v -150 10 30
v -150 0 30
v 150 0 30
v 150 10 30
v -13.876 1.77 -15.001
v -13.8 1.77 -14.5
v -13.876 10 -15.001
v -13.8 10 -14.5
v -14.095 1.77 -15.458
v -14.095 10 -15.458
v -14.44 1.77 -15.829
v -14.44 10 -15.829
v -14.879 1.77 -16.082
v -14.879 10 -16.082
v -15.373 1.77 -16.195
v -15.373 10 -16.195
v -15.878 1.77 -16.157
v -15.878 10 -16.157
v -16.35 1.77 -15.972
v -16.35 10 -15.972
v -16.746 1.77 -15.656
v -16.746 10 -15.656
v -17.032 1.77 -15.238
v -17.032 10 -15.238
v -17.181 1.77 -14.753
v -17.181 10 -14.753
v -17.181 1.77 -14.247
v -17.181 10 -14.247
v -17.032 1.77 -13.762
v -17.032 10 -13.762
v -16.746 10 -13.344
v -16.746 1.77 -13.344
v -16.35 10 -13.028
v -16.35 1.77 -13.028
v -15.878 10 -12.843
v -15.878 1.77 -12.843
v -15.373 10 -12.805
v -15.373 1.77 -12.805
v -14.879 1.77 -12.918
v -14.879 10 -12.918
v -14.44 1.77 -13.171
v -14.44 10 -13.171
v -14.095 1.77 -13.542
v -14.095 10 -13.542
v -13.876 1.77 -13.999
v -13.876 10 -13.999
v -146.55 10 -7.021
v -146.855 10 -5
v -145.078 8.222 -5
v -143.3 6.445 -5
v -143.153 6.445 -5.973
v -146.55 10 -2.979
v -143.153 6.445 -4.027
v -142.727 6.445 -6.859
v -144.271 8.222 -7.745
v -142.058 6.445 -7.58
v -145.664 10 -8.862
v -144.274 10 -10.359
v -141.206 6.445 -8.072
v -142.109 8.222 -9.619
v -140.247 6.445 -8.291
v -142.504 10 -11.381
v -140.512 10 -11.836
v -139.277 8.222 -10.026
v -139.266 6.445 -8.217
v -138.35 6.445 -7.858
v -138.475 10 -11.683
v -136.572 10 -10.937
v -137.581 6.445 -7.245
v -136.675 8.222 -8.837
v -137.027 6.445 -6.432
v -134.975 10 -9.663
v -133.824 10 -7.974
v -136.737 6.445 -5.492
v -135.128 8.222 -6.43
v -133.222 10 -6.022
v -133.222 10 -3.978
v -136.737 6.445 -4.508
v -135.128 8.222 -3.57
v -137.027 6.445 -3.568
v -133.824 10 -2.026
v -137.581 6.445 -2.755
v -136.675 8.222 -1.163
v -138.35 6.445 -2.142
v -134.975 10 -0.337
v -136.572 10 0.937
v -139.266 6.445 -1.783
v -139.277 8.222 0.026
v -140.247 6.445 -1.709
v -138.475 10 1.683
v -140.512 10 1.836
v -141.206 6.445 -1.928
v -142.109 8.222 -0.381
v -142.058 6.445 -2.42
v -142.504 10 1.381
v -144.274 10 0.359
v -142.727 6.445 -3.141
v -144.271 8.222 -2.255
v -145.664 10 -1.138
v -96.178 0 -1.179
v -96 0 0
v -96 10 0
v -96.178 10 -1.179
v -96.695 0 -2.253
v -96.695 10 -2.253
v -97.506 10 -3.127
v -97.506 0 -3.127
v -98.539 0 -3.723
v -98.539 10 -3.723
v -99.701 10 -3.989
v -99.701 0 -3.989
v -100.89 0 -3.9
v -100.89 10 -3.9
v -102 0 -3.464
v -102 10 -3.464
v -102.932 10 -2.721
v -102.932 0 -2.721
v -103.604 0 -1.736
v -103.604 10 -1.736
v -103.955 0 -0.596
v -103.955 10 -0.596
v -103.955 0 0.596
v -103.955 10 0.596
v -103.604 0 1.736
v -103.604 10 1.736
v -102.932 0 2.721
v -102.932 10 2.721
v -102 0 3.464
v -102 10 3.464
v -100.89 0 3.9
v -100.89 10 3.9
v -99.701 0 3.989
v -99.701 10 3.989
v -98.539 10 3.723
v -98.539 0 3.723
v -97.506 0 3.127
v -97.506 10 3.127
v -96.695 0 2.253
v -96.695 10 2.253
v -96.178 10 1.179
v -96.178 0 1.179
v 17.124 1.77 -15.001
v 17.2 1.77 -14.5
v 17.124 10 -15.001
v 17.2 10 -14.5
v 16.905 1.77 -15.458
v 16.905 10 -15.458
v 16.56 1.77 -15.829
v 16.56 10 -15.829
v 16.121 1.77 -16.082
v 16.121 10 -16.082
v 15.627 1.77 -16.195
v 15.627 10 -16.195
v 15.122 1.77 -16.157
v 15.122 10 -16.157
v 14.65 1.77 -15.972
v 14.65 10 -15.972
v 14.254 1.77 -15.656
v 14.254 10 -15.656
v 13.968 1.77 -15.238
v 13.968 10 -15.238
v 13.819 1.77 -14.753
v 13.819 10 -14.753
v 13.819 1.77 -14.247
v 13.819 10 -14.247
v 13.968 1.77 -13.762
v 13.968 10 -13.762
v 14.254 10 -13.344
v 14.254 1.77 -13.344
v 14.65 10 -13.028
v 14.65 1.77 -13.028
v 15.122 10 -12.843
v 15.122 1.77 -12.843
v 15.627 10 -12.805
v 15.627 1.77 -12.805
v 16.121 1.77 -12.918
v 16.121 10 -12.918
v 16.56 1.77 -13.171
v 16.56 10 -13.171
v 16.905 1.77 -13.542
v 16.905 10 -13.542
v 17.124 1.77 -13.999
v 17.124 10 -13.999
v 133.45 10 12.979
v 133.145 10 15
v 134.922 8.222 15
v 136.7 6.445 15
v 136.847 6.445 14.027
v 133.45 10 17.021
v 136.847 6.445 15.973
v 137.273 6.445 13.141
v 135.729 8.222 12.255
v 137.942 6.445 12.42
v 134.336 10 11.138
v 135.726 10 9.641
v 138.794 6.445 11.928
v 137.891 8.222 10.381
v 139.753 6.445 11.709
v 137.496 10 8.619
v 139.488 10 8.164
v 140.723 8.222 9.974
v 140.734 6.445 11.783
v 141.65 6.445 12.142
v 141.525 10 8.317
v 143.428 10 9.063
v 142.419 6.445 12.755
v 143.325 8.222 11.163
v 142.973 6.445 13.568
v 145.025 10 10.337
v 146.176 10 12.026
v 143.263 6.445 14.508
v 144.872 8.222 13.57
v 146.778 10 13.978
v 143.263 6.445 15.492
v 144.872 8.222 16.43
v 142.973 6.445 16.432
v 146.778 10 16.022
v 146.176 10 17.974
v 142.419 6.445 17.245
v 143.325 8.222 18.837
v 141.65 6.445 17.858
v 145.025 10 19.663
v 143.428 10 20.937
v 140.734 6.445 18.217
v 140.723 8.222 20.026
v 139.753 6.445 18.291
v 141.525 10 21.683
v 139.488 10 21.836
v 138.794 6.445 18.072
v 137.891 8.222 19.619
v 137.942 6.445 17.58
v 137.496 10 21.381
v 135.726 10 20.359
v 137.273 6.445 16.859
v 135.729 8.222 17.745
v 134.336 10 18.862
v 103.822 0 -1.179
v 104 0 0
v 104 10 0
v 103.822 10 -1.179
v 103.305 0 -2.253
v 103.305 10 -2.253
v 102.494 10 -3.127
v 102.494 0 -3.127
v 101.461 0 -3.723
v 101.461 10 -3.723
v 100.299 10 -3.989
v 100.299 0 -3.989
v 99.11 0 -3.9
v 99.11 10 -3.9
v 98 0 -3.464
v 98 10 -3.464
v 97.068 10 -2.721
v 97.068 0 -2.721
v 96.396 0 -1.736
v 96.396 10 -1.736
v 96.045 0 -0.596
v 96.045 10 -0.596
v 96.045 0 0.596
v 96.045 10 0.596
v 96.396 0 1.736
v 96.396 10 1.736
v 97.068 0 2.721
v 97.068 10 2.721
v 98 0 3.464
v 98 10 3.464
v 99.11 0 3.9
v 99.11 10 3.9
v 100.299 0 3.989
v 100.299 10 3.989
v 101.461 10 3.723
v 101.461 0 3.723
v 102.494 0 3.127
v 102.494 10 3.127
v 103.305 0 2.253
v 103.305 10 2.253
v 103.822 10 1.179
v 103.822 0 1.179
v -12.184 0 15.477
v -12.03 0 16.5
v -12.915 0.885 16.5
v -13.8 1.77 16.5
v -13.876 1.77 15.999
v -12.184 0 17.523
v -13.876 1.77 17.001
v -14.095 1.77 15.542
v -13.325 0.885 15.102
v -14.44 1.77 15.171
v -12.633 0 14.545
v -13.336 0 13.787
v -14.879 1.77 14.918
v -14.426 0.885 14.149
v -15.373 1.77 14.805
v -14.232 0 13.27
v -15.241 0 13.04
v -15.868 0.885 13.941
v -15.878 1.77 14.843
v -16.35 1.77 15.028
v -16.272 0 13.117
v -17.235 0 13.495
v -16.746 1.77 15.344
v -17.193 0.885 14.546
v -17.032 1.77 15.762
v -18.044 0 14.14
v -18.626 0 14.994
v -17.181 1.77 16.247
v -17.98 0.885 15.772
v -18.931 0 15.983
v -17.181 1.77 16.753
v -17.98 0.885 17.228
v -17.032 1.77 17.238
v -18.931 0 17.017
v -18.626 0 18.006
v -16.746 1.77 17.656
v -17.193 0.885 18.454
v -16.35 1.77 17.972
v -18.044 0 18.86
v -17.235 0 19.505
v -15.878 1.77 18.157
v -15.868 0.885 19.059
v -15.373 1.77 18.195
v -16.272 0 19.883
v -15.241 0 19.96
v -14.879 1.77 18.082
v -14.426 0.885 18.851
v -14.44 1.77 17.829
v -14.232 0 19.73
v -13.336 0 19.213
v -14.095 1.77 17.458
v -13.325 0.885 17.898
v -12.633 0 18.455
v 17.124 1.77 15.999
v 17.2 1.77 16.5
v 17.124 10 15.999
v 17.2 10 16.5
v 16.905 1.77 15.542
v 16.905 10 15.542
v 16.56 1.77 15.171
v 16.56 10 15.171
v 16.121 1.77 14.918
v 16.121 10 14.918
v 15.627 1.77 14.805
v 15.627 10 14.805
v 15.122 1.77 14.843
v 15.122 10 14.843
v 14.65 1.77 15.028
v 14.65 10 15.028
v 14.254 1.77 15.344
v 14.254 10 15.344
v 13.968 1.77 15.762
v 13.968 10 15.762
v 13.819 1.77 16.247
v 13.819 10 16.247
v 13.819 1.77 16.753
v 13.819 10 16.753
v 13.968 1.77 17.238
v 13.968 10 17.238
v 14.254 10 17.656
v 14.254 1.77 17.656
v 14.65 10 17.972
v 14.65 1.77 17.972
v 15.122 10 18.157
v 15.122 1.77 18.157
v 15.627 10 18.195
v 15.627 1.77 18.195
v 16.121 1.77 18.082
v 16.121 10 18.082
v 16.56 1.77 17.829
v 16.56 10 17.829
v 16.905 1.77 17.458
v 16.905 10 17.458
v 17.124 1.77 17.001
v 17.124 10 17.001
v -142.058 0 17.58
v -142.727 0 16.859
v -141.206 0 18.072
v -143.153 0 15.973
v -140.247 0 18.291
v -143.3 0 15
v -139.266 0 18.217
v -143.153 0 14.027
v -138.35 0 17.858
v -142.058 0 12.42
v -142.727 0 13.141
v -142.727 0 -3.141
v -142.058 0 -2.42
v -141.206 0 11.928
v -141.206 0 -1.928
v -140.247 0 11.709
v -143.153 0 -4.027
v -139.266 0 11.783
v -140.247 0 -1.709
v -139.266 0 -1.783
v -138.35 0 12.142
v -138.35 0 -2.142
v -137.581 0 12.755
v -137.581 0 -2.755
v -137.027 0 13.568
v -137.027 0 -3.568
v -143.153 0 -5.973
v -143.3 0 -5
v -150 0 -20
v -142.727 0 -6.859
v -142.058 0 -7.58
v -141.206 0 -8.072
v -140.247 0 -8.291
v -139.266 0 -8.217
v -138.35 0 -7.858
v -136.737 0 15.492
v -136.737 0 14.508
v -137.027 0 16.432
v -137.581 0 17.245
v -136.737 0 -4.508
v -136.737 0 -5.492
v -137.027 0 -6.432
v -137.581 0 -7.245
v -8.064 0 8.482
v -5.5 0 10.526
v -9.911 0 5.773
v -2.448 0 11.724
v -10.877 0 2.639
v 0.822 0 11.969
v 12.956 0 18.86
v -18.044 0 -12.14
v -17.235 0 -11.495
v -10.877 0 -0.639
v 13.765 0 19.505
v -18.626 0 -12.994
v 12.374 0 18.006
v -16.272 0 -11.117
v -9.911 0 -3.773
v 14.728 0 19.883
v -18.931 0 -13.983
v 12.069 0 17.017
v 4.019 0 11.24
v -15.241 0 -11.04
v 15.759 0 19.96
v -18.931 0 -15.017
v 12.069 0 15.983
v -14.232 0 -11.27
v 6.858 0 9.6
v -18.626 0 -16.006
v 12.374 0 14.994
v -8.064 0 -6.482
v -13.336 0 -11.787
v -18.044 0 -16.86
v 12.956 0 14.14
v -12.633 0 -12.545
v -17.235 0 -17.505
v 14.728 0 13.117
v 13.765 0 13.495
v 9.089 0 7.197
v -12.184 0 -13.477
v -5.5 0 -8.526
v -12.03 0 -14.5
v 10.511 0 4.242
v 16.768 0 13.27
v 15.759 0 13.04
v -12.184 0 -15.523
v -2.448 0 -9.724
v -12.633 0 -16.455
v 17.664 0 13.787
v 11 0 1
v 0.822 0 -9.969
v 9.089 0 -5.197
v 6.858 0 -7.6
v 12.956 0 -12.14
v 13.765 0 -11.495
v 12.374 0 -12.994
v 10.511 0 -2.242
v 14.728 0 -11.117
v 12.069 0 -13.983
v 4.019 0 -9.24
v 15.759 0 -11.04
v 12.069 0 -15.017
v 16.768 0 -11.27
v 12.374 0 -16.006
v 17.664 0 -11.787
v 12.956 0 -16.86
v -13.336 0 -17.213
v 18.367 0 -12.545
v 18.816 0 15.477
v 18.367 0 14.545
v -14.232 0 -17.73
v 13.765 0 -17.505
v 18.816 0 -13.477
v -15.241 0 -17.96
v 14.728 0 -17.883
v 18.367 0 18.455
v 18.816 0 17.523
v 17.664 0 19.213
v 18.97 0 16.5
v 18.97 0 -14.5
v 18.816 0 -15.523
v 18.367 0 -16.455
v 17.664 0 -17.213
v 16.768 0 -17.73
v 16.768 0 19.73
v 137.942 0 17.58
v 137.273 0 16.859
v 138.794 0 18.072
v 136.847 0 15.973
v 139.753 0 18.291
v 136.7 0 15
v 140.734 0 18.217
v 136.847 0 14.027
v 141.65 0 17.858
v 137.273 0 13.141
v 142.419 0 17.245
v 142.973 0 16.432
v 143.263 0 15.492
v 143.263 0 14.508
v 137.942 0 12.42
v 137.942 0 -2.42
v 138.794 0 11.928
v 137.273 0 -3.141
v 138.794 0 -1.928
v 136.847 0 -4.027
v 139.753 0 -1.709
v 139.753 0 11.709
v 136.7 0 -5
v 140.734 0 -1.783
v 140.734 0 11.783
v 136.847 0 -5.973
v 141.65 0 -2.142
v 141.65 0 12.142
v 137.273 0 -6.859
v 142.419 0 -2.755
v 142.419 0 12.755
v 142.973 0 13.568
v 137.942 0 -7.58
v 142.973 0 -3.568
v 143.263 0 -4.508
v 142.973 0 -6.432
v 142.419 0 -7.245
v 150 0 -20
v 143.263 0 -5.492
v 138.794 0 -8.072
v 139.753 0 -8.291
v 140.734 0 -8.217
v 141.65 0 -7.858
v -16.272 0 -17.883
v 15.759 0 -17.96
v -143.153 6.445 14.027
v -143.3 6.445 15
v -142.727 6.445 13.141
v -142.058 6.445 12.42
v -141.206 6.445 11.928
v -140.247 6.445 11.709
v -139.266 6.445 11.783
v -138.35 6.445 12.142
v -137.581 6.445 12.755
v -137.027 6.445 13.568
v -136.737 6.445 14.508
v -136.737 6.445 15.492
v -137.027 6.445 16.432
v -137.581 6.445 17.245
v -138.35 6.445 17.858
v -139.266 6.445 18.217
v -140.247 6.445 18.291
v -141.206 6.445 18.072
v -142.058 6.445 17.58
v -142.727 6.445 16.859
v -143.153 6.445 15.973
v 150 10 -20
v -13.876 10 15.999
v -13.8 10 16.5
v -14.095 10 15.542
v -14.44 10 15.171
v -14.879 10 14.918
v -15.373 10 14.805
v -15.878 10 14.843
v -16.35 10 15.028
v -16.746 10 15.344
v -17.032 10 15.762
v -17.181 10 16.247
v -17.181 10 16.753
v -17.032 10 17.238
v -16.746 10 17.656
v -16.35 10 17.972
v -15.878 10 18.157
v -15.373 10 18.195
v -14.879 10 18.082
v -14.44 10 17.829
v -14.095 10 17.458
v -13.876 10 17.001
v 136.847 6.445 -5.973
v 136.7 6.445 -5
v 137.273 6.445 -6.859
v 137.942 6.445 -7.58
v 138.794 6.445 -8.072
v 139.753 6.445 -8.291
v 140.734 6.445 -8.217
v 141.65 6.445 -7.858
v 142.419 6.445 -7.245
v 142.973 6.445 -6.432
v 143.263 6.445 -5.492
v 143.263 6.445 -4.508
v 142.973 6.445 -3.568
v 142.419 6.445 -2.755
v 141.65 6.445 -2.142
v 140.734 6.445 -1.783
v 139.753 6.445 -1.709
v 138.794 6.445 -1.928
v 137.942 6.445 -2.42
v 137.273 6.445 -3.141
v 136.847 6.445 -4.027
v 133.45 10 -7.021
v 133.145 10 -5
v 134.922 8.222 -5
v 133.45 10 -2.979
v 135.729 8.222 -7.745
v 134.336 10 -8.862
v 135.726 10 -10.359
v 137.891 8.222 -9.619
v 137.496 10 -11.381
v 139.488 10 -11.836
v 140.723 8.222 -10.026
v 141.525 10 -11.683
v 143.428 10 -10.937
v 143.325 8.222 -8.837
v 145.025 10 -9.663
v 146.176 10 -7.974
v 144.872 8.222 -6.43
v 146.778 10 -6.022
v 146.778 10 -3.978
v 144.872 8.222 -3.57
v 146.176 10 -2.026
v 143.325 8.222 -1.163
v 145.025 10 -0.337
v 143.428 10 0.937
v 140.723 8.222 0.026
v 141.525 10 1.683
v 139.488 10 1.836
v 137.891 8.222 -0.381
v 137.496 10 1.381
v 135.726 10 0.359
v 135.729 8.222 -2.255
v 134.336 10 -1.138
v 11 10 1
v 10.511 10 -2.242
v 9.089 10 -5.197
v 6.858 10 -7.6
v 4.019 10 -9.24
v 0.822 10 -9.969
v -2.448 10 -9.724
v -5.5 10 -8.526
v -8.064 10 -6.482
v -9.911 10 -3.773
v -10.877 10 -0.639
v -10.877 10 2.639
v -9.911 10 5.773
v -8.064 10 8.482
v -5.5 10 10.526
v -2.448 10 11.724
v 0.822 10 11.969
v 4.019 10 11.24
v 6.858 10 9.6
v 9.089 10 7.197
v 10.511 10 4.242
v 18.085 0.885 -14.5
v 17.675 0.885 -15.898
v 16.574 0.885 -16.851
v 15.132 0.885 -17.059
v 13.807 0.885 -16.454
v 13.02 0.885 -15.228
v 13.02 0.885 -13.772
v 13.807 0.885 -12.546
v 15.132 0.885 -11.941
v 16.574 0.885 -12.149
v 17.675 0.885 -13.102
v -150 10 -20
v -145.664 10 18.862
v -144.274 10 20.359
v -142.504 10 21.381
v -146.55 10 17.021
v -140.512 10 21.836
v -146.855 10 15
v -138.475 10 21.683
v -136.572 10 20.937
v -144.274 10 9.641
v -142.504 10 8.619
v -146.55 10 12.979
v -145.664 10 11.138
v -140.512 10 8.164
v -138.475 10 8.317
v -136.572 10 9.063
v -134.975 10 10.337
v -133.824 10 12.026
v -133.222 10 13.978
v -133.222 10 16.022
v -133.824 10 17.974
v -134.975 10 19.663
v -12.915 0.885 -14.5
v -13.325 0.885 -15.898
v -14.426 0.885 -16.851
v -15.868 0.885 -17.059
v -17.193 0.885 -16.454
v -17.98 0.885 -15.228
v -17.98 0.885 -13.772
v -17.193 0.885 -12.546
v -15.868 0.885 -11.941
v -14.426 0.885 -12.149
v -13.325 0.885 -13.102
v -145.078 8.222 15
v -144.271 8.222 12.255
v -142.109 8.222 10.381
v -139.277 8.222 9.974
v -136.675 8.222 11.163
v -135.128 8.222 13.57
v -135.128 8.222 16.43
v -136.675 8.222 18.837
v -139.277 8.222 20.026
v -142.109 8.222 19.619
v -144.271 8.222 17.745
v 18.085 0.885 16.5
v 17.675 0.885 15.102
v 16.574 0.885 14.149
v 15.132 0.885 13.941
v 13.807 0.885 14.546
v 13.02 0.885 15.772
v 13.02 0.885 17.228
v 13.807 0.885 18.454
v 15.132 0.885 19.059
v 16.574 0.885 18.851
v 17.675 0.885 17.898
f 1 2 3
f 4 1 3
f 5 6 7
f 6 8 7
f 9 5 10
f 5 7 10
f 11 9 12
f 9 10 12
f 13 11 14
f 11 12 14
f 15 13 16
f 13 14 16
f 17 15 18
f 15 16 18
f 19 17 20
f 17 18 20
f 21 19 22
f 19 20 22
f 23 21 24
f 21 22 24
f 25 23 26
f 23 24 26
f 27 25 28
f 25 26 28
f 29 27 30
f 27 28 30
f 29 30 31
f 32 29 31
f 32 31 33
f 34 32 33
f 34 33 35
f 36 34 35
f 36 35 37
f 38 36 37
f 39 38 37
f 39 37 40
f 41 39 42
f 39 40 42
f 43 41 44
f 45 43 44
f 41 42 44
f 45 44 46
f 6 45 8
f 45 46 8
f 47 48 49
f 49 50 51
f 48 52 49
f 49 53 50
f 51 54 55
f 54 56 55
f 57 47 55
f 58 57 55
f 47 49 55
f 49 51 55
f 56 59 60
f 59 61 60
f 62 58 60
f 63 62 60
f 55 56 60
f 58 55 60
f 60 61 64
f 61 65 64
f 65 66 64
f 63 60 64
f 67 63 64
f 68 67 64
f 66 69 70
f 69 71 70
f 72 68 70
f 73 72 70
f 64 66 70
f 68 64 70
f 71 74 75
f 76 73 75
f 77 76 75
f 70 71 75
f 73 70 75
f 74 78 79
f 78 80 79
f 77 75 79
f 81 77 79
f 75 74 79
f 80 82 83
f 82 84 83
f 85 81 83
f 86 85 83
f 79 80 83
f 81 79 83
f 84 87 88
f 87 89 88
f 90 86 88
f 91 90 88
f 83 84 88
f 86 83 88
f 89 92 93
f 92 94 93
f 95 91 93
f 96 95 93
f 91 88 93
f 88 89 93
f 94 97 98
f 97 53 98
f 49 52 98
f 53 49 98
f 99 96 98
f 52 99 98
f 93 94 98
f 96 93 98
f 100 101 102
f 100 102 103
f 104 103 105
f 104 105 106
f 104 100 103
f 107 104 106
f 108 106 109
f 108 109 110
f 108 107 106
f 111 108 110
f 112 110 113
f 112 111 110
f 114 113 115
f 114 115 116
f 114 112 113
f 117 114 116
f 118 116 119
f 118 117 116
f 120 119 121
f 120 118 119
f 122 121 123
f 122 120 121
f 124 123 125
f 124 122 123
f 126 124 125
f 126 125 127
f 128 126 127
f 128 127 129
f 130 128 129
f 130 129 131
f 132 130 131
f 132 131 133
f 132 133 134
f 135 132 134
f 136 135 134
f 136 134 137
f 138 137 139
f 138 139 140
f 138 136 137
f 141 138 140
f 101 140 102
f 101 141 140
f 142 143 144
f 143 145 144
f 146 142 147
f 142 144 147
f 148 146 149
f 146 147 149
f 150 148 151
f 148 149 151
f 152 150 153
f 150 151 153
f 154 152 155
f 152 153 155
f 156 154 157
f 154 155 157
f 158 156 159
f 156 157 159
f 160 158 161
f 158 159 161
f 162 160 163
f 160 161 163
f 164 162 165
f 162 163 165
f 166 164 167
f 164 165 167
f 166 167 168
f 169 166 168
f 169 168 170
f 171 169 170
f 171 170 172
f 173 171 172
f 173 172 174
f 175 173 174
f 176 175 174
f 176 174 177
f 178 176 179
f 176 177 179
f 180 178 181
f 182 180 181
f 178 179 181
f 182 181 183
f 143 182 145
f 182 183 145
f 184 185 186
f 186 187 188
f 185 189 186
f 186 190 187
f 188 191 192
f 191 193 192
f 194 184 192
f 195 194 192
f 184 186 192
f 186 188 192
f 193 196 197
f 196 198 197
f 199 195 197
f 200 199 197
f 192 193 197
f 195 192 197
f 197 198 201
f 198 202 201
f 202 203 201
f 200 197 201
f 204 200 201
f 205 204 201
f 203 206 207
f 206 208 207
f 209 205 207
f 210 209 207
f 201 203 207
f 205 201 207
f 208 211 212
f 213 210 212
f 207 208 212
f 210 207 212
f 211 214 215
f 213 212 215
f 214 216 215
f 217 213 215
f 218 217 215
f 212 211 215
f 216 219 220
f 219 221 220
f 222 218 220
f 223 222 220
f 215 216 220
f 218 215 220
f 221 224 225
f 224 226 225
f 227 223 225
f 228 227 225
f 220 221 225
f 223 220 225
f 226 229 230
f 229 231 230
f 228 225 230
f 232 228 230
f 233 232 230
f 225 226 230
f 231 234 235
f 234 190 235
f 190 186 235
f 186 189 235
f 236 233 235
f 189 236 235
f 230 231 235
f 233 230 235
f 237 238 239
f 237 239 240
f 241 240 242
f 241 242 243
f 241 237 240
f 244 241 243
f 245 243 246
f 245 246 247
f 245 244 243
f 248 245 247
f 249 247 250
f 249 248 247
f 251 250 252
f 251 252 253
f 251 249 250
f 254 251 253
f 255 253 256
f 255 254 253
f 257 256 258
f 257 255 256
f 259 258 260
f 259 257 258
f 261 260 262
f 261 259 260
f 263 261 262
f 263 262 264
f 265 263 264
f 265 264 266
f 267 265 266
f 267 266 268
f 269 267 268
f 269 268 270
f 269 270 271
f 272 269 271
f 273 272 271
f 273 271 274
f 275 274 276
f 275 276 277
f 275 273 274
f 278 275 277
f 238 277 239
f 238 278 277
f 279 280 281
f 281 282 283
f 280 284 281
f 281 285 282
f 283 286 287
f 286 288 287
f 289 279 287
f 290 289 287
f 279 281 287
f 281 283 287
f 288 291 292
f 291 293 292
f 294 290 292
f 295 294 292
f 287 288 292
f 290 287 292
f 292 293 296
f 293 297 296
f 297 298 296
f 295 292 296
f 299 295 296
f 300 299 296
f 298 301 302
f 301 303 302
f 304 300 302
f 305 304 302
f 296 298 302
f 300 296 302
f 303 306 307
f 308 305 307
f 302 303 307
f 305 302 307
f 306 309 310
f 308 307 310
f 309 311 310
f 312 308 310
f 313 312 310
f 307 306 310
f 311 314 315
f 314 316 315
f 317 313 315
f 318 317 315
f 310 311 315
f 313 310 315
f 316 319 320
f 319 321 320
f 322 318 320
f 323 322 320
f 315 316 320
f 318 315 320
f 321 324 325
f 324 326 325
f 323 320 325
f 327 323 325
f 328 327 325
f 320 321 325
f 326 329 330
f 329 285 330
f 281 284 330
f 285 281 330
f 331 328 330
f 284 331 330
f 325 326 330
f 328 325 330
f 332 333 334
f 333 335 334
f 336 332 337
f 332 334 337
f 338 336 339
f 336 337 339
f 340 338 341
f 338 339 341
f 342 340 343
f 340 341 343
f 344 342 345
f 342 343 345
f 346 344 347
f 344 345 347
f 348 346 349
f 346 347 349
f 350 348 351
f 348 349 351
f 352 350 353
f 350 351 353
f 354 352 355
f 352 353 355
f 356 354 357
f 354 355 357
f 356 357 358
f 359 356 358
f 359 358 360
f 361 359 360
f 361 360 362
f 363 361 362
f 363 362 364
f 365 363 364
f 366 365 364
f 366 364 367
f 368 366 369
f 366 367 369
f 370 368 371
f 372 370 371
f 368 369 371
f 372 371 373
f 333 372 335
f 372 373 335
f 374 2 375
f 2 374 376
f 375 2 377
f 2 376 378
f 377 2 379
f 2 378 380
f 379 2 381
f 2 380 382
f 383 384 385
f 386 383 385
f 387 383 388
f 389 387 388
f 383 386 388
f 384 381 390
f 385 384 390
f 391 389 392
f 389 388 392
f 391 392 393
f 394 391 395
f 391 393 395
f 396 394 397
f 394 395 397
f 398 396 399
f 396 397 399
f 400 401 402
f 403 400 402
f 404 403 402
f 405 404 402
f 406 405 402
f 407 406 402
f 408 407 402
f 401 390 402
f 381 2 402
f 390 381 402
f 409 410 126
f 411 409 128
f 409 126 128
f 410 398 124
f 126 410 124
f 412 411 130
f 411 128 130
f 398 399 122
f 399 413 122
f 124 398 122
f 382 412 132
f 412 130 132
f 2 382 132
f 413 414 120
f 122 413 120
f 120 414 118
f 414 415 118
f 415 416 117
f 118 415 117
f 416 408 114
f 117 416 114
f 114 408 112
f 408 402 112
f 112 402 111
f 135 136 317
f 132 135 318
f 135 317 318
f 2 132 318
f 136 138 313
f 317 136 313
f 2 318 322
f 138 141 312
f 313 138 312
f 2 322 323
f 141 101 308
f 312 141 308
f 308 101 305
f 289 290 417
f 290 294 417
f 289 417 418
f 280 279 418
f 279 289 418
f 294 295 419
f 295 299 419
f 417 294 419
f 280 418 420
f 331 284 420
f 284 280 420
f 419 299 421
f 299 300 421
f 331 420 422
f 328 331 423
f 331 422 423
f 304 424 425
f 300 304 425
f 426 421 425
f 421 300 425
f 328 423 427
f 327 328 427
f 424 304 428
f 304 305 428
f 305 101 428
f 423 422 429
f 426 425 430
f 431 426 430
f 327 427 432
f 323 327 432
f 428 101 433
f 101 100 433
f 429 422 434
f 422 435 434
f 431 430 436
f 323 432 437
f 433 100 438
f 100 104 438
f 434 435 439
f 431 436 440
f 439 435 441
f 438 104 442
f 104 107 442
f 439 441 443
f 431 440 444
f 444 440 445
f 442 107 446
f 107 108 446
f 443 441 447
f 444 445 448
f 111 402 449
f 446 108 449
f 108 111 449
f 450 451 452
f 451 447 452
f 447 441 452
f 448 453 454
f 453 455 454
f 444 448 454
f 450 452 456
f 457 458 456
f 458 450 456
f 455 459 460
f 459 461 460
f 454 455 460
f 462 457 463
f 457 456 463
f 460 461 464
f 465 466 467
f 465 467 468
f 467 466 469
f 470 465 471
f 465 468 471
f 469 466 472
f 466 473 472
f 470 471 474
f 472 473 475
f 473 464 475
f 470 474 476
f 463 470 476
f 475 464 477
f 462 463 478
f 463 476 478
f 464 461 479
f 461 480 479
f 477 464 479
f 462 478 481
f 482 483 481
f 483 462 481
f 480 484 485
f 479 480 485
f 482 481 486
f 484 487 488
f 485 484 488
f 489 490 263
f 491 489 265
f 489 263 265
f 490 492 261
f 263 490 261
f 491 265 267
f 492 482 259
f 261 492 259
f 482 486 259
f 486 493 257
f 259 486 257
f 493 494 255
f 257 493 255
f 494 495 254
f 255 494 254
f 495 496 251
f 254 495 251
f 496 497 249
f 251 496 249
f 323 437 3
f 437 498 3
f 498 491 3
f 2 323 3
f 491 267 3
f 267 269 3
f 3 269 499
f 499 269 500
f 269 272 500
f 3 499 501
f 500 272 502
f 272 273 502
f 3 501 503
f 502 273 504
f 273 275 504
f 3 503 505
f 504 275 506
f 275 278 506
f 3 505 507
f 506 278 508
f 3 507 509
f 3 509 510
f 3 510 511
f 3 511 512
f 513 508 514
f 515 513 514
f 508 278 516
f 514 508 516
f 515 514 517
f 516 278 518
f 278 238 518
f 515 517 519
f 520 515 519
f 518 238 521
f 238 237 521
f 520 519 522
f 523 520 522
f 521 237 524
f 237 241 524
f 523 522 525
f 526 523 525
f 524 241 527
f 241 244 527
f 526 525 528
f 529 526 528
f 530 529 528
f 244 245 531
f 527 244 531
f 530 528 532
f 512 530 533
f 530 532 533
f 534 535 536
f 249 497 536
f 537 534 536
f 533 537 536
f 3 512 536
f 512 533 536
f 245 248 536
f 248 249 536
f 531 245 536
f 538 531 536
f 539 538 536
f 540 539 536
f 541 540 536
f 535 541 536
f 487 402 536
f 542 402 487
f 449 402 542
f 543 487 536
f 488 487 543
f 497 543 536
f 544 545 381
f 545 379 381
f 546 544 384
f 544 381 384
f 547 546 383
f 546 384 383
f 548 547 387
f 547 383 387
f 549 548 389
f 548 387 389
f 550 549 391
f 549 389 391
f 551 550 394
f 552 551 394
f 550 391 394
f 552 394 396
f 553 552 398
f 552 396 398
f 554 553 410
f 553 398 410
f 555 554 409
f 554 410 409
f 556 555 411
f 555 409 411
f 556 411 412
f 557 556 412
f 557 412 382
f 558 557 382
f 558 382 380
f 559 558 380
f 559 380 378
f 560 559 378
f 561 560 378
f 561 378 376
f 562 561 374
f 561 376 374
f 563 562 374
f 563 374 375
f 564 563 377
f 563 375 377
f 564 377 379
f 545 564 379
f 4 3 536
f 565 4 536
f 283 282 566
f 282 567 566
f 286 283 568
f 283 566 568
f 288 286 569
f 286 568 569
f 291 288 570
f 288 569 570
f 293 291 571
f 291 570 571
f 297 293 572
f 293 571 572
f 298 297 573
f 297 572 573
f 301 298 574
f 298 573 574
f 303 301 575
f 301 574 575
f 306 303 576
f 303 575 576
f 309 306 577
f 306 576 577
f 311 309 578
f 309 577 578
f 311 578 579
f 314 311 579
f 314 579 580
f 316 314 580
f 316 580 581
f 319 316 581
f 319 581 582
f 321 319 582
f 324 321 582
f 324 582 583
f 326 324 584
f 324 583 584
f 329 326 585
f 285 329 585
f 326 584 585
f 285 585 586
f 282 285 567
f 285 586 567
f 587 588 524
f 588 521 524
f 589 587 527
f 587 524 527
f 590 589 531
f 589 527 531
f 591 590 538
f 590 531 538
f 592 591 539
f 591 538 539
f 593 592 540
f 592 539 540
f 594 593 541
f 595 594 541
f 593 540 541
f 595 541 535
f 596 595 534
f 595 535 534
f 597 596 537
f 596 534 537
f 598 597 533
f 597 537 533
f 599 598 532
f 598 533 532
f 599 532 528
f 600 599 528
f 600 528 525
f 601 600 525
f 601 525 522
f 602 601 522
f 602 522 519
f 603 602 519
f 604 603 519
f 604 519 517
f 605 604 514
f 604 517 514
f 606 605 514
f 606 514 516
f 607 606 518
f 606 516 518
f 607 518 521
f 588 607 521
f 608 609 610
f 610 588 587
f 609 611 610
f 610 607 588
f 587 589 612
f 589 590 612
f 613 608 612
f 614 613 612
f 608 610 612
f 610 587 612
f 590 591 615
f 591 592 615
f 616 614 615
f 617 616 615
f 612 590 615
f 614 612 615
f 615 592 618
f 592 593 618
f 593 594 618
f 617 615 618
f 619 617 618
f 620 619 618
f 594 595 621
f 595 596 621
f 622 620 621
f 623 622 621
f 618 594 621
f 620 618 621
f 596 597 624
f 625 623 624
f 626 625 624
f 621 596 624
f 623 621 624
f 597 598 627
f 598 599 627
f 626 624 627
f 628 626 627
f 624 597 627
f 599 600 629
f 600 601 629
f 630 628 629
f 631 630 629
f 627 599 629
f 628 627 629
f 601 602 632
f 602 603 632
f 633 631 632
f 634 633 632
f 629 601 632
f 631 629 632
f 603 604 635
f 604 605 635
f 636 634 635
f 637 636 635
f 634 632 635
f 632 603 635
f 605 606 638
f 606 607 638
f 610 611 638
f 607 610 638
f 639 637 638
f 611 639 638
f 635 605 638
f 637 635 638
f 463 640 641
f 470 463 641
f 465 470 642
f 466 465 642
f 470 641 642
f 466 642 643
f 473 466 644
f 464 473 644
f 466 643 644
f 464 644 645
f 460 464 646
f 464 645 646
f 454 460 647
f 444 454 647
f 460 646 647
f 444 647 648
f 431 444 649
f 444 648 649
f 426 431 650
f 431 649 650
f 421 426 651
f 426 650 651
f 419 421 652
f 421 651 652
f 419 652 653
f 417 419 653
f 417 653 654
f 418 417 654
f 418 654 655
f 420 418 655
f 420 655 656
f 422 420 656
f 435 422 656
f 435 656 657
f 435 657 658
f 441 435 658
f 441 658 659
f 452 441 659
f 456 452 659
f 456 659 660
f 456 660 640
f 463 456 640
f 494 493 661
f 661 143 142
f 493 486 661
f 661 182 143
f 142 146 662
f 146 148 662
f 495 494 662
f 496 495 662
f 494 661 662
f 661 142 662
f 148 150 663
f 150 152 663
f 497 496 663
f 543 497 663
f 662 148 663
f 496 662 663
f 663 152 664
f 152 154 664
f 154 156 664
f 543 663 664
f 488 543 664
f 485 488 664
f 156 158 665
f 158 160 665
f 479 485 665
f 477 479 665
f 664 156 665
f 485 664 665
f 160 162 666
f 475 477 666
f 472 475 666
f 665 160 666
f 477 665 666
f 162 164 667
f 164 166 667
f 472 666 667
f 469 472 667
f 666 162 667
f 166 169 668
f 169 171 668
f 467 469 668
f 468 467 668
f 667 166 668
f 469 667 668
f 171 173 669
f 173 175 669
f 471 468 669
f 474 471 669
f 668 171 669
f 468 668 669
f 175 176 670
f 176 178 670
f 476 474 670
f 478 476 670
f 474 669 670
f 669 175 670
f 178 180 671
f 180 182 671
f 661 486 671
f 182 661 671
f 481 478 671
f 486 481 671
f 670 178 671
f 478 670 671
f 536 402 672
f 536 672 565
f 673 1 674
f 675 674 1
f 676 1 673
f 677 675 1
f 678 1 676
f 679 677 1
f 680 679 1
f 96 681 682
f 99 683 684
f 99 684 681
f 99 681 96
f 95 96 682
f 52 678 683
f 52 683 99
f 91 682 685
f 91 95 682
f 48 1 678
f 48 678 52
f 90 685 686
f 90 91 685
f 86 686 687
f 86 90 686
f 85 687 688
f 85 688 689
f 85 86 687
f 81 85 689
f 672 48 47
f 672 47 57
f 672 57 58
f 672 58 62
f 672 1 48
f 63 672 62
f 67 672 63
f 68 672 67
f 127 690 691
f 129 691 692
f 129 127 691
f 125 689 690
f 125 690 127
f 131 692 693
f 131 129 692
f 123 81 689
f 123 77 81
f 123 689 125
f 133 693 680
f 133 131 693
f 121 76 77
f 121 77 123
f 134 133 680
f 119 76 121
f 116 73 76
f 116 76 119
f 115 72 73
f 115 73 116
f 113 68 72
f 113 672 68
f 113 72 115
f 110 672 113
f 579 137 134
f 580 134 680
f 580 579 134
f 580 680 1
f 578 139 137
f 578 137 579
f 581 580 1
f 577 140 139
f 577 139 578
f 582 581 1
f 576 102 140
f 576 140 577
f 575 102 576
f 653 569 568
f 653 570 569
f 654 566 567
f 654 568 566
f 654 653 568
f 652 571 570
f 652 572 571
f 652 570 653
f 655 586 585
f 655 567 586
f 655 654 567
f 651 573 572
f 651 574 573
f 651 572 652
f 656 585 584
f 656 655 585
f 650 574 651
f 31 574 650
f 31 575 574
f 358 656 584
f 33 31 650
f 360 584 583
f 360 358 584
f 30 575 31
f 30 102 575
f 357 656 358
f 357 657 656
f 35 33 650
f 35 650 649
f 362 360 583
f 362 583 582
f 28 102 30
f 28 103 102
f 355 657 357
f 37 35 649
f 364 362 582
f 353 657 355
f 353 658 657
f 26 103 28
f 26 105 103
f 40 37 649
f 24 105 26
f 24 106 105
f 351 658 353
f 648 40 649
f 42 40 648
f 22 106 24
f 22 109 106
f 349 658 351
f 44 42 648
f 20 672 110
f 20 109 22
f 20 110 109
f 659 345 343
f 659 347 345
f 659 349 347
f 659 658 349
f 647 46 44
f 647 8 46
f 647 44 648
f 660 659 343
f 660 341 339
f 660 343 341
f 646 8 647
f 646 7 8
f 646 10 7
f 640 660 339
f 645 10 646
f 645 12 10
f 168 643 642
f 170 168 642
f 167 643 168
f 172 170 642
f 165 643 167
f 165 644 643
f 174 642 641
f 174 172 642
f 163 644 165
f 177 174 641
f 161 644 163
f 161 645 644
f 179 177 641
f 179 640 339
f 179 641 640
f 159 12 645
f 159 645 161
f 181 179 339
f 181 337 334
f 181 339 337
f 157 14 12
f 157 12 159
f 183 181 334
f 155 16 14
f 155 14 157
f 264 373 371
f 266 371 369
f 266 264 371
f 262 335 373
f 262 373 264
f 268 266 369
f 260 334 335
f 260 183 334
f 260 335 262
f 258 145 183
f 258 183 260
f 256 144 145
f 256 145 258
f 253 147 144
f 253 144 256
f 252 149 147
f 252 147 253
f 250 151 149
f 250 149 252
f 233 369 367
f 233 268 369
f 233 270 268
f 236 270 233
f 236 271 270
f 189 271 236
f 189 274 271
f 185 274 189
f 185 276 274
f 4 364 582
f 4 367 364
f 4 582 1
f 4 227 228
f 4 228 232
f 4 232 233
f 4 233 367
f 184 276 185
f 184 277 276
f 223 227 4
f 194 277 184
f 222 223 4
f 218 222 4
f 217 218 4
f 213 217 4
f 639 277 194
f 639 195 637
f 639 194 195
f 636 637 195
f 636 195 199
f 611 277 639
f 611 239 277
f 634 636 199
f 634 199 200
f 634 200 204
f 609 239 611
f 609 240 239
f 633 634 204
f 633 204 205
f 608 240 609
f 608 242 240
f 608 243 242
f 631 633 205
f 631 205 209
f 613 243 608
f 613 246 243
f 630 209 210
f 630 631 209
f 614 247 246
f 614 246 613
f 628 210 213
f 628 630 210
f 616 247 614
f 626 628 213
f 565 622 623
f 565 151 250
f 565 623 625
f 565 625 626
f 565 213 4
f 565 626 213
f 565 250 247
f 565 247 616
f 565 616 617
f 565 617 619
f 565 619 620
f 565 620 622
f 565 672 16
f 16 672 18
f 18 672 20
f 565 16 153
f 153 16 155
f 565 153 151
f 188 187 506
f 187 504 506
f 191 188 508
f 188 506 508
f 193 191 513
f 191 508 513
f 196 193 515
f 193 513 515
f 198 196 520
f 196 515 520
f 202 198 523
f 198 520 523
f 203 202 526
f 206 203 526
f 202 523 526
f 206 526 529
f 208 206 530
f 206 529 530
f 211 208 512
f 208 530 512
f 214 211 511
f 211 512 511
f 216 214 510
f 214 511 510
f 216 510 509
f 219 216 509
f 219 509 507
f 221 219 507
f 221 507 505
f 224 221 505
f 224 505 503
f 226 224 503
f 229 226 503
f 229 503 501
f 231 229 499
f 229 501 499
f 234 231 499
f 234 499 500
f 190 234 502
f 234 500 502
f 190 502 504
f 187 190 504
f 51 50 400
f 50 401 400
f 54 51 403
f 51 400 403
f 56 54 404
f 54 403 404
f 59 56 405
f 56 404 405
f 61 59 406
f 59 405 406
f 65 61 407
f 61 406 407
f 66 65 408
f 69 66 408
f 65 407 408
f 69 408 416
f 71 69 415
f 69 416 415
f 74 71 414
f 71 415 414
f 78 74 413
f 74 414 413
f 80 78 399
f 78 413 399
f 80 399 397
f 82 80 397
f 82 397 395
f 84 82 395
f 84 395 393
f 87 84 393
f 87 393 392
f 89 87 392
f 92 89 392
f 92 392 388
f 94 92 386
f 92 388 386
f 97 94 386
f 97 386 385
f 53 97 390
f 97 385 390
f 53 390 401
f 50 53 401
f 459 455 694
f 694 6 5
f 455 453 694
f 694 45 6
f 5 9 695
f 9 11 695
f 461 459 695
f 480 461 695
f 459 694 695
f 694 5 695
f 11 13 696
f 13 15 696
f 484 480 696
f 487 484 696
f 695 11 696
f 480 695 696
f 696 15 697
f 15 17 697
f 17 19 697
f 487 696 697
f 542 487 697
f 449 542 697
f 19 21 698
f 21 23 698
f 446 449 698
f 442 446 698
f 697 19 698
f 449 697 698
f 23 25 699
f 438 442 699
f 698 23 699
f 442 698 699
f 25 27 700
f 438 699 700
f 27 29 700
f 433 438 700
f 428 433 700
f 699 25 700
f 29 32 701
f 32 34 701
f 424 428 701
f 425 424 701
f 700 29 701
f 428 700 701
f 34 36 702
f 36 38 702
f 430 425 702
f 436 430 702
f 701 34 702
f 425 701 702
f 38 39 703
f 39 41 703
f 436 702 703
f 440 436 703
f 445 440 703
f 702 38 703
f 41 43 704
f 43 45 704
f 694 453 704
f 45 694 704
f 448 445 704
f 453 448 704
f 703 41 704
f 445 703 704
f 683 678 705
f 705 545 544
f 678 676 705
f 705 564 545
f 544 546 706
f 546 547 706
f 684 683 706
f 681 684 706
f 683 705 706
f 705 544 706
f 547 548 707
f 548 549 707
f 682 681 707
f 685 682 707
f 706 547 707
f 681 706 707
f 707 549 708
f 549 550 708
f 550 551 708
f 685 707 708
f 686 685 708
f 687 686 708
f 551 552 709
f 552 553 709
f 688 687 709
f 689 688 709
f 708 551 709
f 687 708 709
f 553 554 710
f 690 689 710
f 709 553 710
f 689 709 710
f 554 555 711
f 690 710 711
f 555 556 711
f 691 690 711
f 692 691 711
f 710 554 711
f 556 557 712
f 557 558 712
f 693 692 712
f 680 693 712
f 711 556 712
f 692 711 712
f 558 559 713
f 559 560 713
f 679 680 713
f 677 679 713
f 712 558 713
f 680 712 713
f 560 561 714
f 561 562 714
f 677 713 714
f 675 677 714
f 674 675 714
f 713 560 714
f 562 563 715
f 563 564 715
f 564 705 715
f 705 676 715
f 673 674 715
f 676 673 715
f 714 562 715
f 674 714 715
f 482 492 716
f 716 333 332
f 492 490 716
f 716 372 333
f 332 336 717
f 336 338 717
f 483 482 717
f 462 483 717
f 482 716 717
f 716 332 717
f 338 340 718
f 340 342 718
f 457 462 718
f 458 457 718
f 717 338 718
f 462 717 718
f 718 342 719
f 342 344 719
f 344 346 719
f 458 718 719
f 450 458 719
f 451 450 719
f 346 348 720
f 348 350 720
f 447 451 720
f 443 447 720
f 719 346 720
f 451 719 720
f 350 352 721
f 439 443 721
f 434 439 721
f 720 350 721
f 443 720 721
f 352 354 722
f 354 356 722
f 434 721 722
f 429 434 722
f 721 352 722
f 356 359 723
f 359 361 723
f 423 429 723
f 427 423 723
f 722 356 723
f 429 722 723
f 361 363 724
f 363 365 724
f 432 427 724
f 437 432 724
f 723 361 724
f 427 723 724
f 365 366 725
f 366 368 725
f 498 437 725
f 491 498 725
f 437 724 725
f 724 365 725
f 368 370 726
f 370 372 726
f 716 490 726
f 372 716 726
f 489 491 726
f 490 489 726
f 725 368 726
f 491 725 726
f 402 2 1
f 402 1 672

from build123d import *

# Parameters (mm, degrees)
SKETCH1_W                                            = 300
SKETCH1_H                                            = 50
SKETCH1_R                                            = 4
MAIN_DEPTH                                           = 10
SKETCH4_R                                            = 2.5
MOUNT_DEPTH                                          = 11
SKETCH2_R                                            = 11
SKETCH2_R_2                                          = 1.5
STEPPER_MOUNT_DEPTH                                  = 11
CSK_FOR_M6_SOCKET_COUNTERSUNK_HEAD_SCREW_D           = 6.6
CSK_FOR_M6_SOCKET_COUNTERSUNK_HEAD_SCREW_DEPTH       = 15
CSK_FOR_M6_SOCKET_COUNTERSUNK_HEAD_SCREW_CSINK_D     = 13.71
CSK_FOR_M6_SOCKET_COUNTERSUNK_HEAD_SCREW_CSINK_ANGLE = 90
CSK_FOR_M6_SOCKET_COUNTERSUNK_HEAD_SCREW_TIP         = 1.982840043
CSK_FOR_M3_SOCKET_COUNTERSUNK_HEAD_SCREW_D           = 3.4
CSK_FOR_M3_SOCKET_COUNTERSUNK_HEAD_SCREW_DEPTH       = 15
CSK_FOR_M3_SOCKET_COUNTERSUNK_HEAD_SCREW_CSINK_D     = 6.94
CSK_FOR_M3_SOCKET_COUNTERSUNK_HEAD_SCREW_CSINK_ANGLE = 90
CSK_FOR_M3_SOCKET_COUNTERSUNK_HEAD_SCREW_TIP         = 1.021463052


with BuildPart() as part:
    # Sketch1 → main (new body)
    with BuildSketch(Plane(origin=(0, 0, 0), x_dir=(1, 0, 0), z_dir=(0, 1, 0))):
        with Locations((0, -5)):
            Rectangle(SKETCH1_W, SKETCH1_H)
        with Locations((-100, 0)):
            Circle(SKETCH1_R, mode=Mode.SUBTRACT)
        with Locations((100, 0)):
            Circle(SKETCH1_R, mode=Mode.SUBTRACT)
    extrude(amount=MAIN_DEPTH)

    # Sketch4 → mount (cut, through all)
    with BuildSketch(Plane(origin=(0, 10, 0), x_dir=(1, 0, 0), z_dir=(0, 1, 0))):
        with Locations((-140, 5)):
            Circle(SKETCH4_R)
        with Locations((-140, -15)):
            Circle(SKETCH4_R)
        with Locations((140, -15)):
            Circle(SKETCH4_R)
        with Locations((140, 5)):
            Circle(SKETCH4_R)
    extrude(amount=-MOUNT_DEPTH, mode=Mode.SUBTRACT)

    # Sketch2 → stepper_mount (cut, through all)
    with BuildSketch(Plane(origin=(0, 10, 0), x_dir=(1, 0, 0), z_dir=(0, 1, 0))):
        with Locations((0, -1)):
            Circle(SKETCH2_R)
        with Locations((15.5, -16.5)):
            Circle(SKETCH2_R_2)
        with Locations((-15.5, -16.5)):
            Circle(SKETCH2_R_2)
        with Locations((-15.5, 14.5)):
            Circle(SKETCH2_R_2)
        with Locations((15.5, 14.5)):
            Circle(SKETCH2_R_2)
    extrude(amount=-STEPPER_MOUNT_DEPTH, mode=Mode.SUBTRACT)

    # CSK for M6 socket countersunk head screw1
    with Locations(Plane(origin=(0, 10, 0), x_dir=(1, 0, 0), z_dir=(0, 1, 0))):
        with Locations((140, -15), (140, 5), (-140, -15), (-140, 5)):
            CounterSinkHole(CSK_FOR_M6_SOCKET_COUNTERSUNK_HEAD_SCREW_D / 2, CSK_FOR_M6_SOCKET_COUNTERSUNK_HEAD_SCREW_CSINK_D / 2, depth=CSK_FOR_M6_SOCKET_COUNTERSUNK_HEAD_SCREW_DEPTH, counter_sink_angle=CSK_FOR_M6_SOCKET_COUNTERSUNK_HEAD_SCREW_CSINK_ANGLE)
            with Locations((0, 0, -(CSK_FOR_M6_SOCKET_COUNTERSUNK_HEAD_SCREW_DEPTH + CSK_FOR_M6_SOCKET_COUNTERSUNK_HEAD_SCREW_TIP / 2))):  # 118° drill point
                Cone(0, CSK_FOR_M6_SOCKET_COUNTERSUNK_HEAD_SCREW_D / 2, CSK_FOR_M6_SOCKET_COUNTERSUNK_HEAD_SCREW_TIP, mode=Mode.SUBTRACT)

    # CSK for M3 socket countersunk head screw1
    with Locations(Plane(origin=(0, 0, 0), x_dir=(-1, 0, 0), z_dir=(0, -1, 0))):
        with Locations((15.5, -16.5), (-15.5, -16.5), (-15.5, 14.5), (15.5, 14.5)):
            CounterSinkHole(CSK_FOR_M3_SOCKET_COUNTERSUNK_HEAD_SCREW_D / 2, CSK_FOR_M3_SOCKET_COUNTERSUNK_HEAD_SCREW_CSINK_D / 2, depth=CSK_FOR_M3_SOCKET_COUNTERSUNK_HEAD_SCREW_DEPTH, counter_sink_angle=CSK_FOR_M3_SOCKET_COUNTERSUNK_HEAD_SCREW_CSINK_ANGLE)
            with Locations((0, 0, -(CSK_FOR_M3_SOCKET_COUNTERSUNK_HEAD_SCREW_DEPTH + CSK_FOR_M3_SOCKET_COUNTERSUNK_HEAD_SCREW_TIP / 2))):  # 118° drill point
                Cone(0, CSK_FOR_M3_SOCKET_COUNTERSUNK_HEAD_SCREW_D / 2, CSK_FOR_M3_SOCKET_COUNTERSUNK_HEAD_SCREW_TIP, mode=Mode.SUBTRACT)


solid = part.part
